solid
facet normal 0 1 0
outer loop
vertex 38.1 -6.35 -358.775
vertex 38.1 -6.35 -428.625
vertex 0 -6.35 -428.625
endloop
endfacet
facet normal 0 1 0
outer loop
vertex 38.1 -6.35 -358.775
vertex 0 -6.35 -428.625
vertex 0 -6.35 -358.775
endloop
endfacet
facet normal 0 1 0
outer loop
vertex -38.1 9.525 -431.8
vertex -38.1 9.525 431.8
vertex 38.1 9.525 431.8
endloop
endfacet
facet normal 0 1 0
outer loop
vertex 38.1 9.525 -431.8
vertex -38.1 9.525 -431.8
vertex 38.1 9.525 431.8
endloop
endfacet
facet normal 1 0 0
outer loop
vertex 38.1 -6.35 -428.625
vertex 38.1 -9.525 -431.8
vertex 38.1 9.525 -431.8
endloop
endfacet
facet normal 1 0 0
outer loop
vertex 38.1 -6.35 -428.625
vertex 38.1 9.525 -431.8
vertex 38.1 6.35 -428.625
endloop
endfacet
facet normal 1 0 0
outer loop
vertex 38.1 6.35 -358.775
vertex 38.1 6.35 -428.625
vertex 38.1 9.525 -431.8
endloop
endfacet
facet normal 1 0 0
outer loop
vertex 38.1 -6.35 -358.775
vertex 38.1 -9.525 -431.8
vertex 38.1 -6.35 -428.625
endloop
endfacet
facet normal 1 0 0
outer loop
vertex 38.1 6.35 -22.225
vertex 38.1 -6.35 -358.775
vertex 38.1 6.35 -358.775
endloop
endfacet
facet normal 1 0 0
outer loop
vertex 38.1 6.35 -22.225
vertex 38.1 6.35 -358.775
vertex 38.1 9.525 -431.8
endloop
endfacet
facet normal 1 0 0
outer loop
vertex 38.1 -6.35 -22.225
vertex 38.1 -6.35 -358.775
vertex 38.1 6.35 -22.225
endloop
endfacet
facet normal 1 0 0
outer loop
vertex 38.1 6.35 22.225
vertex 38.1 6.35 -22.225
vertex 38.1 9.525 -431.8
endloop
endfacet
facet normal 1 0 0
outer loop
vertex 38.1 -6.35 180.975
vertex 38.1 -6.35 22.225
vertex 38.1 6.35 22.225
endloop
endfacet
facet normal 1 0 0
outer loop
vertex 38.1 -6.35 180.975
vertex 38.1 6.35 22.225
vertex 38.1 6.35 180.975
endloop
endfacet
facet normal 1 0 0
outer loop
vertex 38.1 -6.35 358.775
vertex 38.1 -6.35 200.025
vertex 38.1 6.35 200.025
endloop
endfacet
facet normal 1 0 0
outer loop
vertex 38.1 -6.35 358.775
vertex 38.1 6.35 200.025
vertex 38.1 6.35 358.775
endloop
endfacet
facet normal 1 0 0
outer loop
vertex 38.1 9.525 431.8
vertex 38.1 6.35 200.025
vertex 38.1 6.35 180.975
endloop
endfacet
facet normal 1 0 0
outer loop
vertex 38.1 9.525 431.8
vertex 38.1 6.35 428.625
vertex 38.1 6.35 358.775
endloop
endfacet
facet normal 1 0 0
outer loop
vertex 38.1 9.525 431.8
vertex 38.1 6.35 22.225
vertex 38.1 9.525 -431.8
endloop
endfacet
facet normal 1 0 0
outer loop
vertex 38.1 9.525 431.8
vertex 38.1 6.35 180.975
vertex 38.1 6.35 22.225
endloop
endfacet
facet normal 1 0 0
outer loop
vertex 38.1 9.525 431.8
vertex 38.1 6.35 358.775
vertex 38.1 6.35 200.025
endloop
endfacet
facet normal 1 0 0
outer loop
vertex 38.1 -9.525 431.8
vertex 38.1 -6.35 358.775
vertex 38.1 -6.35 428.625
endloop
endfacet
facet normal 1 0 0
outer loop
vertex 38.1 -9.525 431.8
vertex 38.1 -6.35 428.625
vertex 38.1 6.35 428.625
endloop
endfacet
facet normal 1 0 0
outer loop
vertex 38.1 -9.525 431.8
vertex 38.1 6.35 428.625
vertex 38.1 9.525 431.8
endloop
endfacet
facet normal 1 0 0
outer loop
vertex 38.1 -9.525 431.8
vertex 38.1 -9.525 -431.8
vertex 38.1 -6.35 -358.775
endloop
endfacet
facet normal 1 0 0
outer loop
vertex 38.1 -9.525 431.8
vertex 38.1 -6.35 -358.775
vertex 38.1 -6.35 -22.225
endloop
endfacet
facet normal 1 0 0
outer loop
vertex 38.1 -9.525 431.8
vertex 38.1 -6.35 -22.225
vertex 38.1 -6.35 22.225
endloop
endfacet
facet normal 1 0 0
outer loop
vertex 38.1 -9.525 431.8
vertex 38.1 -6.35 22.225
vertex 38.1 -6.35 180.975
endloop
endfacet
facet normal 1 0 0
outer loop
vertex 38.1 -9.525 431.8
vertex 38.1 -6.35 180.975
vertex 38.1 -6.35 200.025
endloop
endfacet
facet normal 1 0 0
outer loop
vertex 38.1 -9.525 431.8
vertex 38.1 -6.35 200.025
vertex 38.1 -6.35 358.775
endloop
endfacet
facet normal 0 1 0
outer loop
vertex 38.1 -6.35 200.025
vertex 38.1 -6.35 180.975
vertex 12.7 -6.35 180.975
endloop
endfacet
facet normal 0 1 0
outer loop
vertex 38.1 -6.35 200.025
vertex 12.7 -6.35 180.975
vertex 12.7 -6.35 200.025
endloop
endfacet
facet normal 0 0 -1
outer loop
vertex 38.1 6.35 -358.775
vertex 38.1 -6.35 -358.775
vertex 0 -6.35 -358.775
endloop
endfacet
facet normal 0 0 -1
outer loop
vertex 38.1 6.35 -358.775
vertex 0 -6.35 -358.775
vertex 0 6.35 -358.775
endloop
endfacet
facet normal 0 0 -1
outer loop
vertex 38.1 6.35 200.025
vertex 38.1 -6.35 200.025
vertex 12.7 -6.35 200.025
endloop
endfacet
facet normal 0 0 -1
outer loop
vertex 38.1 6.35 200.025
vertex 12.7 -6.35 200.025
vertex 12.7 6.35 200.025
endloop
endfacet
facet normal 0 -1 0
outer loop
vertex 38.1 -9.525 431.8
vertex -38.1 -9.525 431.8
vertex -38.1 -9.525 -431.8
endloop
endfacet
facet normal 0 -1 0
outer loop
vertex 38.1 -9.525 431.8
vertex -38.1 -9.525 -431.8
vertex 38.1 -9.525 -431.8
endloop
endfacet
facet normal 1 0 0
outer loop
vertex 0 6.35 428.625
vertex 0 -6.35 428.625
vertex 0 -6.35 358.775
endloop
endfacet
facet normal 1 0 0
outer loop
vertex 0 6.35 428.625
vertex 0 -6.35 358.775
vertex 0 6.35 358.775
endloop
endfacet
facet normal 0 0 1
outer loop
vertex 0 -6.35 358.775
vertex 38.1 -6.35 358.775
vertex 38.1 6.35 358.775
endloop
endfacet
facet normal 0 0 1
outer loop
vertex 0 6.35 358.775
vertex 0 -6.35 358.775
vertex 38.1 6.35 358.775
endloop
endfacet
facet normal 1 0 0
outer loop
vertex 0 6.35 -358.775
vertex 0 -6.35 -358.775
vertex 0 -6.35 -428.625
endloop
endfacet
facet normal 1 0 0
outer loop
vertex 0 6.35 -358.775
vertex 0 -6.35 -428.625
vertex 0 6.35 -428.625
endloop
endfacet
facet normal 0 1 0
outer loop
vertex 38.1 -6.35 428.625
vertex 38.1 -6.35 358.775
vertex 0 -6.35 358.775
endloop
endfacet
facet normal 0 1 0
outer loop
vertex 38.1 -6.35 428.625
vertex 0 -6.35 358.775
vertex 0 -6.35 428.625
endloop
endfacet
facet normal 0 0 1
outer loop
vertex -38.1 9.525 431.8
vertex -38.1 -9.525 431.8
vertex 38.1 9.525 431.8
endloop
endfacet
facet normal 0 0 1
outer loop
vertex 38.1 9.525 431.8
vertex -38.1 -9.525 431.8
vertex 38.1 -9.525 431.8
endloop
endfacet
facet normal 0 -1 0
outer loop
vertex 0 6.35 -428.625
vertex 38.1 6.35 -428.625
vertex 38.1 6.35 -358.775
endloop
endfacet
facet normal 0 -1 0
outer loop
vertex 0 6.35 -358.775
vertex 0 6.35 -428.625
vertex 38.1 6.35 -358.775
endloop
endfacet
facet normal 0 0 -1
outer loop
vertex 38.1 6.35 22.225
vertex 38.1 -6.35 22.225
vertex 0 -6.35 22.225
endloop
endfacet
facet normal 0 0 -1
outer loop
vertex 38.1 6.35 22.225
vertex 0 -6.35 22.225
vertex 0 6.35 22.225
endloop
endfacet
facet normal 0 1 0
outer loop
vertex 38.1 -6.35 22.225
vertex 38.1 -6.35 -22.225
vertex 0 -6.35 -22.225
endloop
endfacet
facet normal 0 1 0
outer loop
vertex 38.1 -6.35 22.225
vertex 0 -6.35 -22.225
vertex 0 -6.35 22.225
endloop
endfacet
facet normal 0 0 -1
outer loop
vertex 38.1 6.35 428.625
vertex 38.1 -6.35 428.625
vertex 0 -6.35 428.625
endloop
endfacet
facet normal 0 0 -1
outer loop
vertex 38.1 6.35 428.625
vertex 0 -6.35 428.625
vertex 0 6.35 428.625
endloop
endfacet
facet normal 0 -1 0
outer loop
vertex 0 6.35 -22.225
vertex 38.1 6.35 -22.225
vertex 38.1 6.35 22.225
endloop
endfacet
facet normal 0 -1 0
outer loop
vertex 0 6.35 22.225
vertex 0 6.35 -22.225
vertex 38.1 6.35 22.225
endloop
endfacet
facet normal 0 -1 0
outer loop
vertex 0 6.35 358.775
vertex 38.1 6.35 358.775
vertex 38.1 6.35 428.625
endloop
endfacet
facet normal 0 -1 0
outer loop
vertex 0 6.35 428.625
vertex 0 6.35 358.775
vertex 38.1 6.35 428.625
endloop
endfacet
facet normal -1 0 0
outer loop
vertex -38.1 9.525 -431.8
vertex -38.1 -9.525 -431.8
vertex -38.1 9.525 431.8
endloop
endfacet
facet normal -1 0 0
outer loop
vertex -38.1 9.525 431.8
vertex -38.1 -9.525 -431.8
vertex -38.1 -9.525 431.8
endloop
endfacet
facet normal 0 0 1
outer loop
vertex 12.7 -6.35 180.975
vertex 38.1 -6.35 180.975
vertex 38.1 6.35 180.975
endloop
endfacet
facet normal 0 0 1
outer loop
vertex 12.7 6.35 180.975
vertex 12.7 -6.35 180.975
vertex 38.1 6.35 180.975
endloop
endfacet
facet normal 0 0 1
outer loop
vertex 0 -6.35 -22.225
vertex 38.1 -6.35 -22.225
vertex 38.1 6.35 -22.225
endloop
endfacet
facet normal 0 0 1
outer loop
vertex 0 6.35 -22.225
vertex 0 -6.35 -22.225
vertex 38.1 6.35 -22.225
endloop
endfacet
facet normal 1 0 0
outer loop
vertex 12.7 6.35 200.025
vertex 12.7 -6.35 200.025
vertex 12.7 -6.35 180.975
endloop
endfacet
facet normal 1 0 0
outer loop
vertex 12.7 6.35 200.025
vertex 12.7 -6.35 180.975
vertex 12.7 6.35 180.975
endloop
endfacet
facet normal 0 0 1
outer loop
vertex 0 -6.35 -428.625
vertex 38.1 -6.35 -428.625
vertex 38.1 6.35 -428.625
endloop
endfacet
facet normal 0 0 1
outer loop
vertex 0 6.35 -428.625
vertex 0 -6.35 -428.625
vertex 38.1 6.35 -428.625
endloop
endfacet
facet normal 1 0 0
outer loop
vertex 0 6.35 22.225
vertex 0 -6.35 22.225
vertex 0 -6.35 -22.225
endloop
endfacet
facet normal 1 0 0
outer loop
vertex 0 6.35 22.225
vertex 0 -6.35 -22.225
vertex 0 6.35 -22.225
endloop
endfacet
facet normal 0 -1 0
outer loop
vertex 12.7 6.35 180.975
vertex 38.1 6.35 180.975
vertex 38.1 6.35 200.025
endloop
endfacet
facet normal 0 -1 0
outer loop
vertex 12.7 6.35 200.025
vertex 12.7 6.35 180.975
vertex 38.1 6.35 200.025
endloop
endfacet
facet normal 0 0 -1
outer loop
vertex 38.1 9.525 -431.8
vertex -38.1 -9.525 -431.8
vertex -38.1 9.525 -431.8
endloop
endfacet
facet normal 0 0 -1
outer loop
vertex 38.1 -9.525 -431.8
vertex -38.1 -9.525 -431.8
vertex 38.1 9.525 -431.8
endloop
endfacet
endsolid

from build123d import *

# Parameters (mm, degrees)
F0_W     = 76.2
F0_H     = 863.6
F1_DEPTH = 9.525
F2_W     = 12.7
F2_H     = 69.85
F3_DEPTH = 38.1
F2_H_2   = 44.45
F4_DEPTH = 38.1
F5_DEPTH = 38.1
F6_W     = 12.7
F6_H     = 19.05
F7_DEPTH = 25.4


with BuildPart() as f1:
    # F0 (on Front) → F1 (new body, symmetric)
    with BuildSketch(Plane.XZ):
        Rectangle(F0_W, F0_H)
    extrude(amount=F1_DEPTH, both=True)

    # F2 (on face) → F3 (cut)
    with BuildSketch(Plane.YZ.offset(38.1)):
        with Locations((0, 393.7)):
            Rectangle(F2_W, F2_H)
    extrude(amount=-F3_DEPTH, mode=Mode.SUBTRACT)

    # F2 (on face) → F4 (cut)
    with BuildSketch(Plane.YZ.offset(38.1)):
        Rectangle(F2_W, F2_H_2)
    extrude(amount=-F4_DEPTH, mode=Mode.SUBTRACT)

    # F2 (on face) → F5 (cut)
    with BuildSketch(Plane.YZ.offset(38.1)):
        with Locations((0, -393.7)):
            Rectangle(F2_W, F2_H)
    extrude(amount=-F5_DEPTH, mode=Mode.SUBTRACT)

    # F6 (on face) → F7 (cut)
    with BuildSketch(Plane.YZ.offset(38.1)):
        with Locations((0, 190.5)):
            Rectangle(F6_W, F6_H)
    extrude(amount=-F7_DEPTH, mode=Mode.SUBTRACT)


solid = f1.part
